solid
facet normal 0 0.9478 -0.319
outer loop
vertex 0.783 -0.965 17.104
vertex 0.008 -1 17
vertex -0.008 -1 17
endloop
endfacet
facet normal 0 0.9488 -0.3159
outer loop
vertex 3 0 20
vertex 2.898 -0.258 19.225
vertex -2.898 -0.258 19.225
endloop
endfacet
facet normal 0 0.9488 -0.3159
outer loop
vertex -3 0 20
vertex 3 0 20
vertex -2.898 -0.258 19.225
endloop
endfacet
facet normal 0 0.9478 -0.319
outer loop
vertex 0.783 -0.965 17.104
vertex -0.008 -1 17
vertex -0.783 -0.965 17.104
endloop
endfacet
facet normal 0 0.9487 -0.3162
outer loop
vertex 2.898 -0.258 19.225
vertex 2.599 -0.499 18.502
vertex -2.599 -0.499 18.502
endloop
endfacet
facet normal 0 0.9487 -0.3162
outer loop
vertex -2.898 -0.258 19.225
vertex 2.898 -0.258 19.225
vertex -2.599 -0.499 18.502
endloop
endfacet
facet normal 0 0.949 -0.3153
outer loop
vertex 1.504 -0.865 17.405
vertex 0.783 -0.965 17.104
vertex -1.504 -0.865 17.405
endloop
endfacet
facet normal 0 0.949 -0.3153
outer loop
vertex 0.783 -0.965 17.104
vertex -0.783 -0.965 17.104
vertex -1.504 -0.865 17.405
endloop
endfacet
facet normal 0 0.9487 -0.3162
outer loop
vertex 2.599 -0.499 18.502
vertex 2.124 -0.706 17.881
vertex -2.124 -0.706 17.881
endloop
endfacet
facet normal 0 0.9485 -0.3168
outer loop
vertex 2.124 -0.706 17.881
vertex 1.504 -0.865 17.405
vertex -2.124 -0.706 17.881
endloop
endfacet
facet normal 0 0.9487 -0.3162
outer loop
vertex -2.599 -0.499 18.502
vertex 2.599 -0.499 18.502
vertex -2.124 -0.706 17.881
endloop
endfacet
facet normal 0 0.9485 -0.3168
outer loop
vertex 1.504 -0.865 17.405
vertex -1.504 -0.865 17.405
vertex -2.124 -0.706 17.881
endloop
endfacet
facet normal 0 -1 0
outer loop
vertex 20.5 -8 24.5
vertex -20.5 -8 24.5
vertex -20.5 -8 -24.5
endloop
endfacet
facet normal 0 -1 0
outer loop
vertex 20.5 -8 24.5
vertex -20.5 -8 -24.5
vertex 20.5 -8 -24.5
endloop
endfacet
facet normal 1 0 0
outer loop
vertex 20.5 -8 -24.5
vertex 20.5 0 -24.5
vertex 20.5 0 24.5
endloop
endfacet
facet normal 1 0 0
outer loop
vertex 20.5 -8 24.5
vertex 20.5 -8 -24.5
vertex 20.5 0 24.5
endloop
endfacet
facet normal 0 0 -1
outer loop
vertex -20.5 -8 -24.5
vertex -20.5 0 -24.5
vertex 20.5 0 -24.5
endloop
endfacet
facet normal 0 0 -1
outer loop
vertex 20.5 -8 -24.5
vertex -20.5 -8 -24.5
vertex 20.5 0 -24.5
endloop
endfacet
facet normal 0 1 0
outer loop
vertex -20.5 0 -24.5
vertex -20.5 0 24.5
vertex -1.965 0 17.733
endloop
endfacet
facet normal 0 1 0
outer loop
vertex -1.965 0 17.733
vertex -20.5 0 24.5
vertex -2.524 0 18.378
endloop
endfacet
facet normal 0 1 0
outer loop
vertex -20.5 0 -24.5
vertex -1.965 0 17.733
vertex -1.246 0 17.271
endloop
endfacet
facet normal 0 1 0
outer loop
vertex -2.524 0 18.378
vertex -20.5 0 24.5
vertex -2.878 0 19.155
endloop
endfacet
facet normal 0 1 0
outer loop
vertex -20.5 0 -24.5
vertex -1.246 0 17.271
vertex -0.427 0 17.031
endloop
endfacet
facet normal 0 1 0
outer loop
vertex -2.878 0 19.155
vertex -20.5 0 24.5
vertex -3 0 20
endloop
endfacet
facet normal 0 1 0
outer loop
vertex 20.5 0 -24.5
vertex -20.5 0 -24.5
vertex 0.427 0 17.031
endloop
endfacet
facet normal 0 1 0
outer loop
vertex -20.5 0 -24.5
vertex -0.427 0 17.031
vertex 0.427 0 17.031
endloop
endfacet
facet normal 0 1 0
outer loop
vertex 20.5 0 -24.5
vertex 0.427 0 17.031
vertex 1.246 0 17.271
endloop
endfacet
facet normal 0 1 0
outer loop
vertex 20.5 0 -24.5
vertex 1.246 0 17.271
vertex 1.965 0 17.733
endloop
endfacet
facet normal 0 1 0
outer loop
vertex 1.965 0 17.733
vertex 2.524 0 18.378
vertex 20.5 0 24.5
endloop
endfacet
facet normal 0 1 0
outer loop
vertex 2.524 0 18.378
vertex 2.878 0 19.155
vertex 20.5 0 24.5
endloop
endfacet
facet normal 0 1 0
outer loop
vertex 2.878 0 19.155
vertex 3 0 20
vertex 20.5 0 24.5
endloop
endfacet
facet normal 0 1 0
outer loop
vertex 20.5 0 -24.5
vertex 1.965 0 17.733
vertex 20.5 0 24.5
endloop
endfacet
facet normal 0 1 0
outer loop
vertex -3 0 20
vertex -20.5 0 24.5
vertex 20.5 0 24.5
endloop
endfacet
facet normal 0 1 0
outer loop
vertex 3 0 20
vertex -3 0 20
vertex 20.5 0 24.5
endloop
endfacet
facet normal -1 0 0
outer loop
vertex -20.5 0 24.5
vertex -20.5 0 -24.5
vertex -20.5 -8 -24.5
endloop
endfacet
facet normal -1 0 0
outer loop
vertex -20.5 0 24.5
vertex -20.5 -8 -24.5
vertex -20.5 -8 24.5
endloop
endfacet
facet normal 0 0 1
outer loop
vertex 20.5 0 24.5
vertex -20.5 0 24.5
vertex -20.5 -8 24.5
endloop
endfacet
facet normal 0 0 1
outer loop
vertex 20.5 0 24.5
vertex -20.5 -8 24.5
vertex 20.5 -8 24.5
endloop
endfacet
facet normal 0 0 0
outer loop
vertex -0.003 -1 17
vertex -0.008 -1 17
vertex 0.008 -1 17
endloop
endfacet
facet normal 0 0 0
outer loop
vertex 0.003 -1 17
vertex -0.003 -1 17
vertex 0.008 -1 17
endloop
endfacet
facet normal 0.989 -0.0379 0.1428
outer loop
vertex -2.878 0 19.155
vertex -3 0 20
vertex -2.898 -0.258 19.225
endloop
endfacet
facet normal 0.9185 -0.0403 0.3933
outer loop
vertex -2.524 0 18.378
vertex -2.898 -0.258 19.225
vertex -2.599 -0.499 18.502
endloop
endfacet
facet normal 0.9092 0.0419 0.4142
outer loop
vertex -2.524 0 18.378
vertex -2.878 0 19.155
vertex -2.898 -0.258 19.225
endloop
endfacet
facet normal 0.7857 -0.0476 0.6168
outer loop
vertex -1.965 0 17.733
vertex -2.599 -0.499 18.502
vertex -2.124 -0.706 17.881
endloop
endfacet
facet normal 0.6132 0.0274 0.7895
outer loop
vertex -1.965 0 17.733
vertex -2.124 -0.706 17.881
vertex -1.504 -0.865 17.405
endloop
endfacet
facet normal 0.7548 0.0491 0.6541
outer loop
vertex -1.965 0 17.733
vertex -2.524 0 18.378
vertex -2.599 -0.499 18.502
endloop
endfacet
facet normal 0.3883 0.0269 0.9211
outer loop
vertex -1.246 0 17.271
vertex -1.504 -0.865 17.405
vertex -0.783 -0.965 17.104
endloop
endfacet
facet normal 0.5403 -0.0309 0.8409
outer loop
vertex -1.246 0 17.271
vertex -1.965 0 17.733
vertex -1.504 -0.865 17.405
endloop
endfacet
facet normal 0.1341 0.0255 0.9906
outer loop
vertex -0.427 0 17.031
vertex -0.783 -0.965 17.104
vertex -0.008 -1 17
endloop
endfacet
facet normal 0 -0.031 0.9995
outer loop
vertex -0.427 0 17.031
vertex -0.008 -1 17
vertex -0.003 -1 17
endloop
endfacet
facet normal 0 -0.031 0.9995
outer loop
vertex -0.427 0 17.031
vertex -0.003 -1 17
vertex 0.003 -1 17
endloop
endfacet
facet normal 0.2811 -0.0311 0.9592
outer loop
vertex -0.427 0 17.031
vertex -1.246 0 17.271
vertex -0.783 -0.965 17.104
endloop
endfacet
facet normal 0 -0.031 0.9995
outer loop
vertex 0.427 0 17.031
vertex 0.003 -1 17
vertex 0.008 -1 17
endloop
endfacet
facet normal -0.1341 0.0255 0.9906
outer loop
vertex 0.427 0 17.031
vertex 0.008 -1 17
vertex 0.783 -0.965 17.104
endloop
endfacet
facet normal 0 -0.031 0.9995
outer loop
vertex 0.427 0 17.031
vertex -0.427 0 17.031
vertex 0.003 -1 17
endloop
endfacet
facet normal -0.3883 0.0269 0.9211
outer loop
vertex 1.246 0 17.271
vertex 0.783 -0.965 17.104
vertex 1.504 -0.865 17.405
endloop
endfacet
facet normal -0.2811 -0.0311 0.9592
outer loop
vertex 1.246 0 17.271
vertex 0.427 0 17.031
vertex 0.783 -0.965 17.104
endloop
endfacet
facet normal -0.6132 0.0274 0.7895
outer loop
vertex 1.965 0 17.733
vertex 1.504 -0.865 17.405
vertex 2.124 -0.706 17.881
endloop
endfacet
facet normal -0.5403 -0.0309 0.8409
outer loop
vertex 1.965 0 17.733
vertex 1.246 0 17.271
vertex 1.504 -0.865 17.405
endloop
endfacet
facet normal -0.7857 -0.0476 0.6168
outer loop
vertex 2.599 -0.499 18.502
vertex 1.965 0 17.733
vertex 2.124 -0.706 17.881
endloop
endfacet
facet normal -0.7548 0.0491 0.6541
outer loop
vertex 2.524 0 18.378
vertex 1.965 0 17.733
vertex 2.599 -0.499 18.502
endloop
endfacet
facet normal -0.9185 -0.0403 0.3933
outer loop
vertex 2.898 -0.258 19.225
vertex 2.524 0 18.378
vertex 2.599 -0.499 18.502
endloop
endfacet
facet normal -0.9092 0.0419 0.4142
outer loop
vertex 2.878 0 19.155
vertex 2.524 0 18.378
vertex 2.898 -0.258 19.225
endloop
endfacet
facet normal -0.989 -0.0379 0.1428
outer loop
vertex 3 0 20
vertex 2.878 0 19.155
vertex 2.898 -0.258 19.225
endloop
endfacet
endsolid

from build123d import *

# Parameters (mm, degrees)
F0_W     = 41
F0_H     = 49
F1_DEPTH = 8
F3_DEPTH = 1
F4_SIZE2 = 2.99999
F4_SIZE  = 0.99999


# Not quite as in the source:
# - a fillet or chamfer is up to 0.001 mm smaller than in the source, because OpenCascade refuses the exact size


with BuildPart() as f1:
    # F0 (on Front) → F1 (new body)
    with BuildSketch(Plane.XZ):
        Rectangle(F0_W, F0_H)
    extrude(amount=F1_DEPTH)

    # F2 (on Front) → F3 (cut)
    with BuildSketch(Plane.XZ):
        with BuildLine():
            Line((3, 20), (-3, 20))
            ThreePointArc((-3, 20), (0, 17), (3, 20))
        make_face()
    extrude(amount=F3_DEPTH, mode=Mode.SUBTRACT)

    # F4 (size 1 and 3 in the source; OpenCascade refuses exactly that, so slightly less here)
    f4_edges = [f1.edges().sort_by_distance(p)[0] for p in [
        (0, -1, 20),
    ]]
    chamfer(f4_edges, length=F4_SIZE, length2=F4_SIZE2)


solid = f1.part
